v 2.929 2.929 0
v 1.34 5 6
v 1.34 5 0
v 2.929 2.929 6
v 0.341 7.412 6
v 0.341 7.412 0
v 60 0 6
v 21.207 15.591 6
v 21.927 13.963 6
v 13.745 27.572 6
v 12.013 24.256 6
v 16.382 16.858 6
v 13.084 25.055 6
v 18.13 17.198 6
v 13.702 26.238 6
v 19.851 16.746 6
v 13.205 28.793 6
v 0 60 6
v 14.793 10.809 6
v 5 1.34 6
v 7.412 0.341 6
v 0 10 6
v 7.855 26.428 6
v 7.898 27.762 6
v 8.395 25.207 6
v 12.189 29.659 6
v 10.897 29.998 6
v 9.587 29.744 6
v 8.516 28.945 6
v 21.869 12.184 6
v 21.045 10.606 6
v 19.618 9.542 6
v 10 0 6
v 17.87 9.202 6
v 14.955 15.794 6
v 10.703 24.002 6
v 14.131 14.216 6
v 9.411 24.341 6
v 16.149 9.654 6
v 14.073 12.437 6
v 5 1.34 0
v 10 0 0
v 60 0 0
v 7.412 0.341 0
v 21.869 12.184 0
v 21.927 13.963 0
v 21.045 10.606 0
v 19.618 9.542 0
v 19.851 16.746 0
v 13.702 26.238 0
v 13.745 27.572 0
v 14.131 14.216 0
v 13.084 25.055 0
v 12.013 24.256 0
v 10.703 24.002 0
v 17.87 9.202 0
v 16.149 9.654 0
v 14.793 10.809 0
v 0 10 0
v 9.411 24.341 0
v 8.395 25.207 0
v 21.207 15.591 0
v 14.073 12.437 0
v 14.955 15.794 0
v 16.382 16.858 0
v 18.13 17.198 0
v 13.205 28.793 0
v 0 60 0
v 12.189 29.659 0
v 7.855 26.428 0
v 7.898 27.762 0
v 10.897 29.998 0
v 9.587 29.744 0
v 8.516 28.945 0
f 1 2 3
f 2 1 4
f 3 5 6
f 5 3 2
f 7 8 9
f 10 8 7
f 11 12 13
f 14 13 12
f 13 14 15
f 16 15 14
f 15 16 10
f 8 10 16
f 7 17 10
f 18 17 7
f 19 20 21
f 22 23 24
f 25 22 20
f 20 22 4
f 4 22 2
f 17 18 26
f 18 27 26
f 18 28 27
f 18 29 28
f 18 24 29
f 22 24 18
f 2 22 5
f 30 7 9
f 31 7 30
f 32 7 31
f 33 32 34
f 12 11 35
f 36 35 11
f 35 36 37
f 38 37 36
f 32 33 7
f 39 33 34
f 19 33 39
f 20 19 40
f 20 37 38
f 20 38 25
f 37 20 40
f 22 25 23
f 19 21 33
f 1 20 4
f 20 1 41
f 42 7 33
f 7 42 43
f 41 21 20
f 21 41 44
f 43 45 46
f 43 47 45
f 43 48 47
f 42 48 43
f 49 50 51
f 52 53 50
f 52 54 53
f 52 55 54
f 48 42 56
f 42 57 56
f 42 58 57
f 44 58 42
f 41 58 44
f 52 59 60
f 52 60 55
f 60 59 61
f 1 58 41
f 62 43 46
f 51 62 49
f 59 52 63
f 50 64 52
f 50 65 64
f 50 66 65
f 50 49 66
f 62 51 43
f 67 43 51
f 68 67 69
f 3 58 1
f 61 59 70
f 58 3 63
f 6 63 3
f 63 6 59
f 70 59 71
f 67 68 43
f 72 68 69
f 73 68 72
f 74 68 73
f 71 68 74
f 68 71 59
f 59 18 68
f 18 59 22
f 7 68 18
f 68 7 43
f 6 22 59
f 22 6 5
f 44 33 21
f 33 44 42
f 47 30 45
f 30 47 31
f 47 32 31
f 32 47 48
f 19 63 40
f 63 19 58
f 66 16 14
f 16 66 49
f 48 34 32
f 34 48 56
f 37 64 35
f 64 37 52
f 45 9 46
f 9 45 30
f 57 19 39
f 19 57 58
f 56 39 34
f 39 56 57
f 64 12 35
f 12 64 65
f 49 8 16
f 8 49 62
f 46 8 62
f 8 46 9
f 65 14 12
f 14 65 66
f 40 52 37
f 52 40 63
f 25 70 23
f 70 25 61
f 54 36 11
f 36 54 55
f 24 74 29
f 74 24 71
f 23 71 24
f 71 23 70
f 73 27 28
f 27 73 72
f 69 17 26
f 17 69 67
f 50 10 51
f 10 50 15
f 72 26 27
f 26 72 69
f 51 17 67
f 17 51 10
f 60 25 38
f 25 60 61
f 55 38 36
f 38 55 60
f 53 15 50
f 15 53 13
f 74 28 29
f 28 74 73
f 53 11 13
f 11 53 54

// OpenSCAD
$fn = 32;

// ----------------------------------------------------------------------
// Bracket plate: corner pad 60 x 60, fillet R10
// ----------------------------------------------------------------------

// --- parameters (mm) ---
hole_r = 3;               // bolt hole radius
plate_t = 6;              // plate thickness, Z (extrusion height)
leg_a = 60;               // base leg
leg_b = 60;               // height leg
fillet_r = 10;            // right-angle fillet radius

hole_d1 = 2 * hole_r + 2;
hole_d2 = 2 * hole_r;

profile = [[10, 0], [60, 0], [0, 60], [0, 10], [0.341, 7.412], [1.34, 5], [2.929, 2.929], [5, 1.34], [7.412, 0.341]];  // primary outline, 9 points, counter clockwise
void_1 = [[21.927, 13.963], [21.207, 15.591], [19.851, 16.746], [18.13, 17.198], [16.382, 16.858], [14.955, 15.794], [14.131, 14.216], [14.073, 12.437], [14.793, 10.809], [16.149, 9.654], [17.87, 9.202], [19.618, 9.542], [21.045, 10.606], [21.869, 12.184]];  // mount hole 1, 14 points
void_2 = [[13.745, 27.572], [13.205, 28.793], [12.189, 29.659], [10.897, 29.998], [9.587, 29.744], [8.516, 28.945], [7.898, 27.762], [7.855, 26.428], [8.395, 25.207], [9.411, 24.341], [10.703, 24.002], [12.013, 24.256], [13.084, 25.055], [13.702, 26.238]];  // mount hole 2, 14 points

// --- the one profile operation ---
difference() {
  linear_extrude(height = plate_t) polygon(points = profile);
  translate([0, 0, -1])
    linear_extrude(height = plate_t + 2) polygon(points = void_1);
  translate([0, 0, -1])
    linear_extrude(height = plate_t + 2) polygon(points = void_2);
}
